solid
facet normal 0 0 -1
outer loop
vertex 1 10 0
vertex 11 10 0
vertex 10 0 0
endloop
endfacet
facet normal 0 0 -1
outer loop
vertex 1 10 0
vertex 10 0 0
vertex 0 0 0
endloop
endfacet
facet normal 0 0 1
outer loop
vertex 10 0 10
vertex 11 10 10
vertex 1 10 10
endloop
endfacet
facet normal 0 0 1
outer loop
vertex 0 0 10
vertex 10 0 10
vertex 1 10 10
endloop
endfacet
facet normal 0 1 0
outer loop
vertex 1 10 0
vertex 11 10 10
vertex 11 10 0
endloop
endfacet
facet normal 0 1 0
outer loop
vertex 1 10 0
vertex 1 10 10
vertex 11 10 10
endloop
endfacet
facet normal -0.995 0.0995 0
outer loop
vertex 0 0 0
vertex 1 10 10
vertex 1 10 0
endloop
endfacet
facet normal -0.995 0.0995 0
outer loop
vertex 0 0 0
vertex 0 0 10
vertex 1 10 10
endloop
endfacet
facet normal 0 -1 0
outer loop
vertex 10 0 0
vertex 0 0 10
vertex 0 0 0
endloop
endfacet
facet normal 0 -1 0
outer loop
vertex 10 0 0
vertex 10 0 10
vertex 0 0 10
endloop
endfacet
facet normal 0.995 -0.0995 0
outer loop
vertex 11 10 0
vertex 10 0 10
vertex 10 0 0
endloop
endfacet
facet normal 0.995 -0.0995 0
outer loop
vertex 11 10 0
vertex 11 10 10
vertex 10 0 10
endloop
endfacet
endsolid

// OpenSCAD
//polyg.scad

//polygon (points= [[-1, 1] [2, 1] [3, -2] [0, -2]]);

linear_extrude (height=10) polygon(points=[[0,0],[10,0],[11,10],[1,10]]); 
//polygon([[0,0],[100,0],[130,50],[30,50]], paths=[[0,1,2,3]]); 
//polygon([[0,0],[100,0],[130,50],[30,50]],[[3,2,1,0]]); 
//polygon([[0,0],[100,0],[130,50],[30,50]],[[1,0,3,2]]); a=[[0,0],[100,0],[130,50],[30,50]]; b=[[3,0,1,2]]; 
//polygon(a); 
//polygon(a,b); 
//polygon(a,[[2,3,0,1,2]]);
